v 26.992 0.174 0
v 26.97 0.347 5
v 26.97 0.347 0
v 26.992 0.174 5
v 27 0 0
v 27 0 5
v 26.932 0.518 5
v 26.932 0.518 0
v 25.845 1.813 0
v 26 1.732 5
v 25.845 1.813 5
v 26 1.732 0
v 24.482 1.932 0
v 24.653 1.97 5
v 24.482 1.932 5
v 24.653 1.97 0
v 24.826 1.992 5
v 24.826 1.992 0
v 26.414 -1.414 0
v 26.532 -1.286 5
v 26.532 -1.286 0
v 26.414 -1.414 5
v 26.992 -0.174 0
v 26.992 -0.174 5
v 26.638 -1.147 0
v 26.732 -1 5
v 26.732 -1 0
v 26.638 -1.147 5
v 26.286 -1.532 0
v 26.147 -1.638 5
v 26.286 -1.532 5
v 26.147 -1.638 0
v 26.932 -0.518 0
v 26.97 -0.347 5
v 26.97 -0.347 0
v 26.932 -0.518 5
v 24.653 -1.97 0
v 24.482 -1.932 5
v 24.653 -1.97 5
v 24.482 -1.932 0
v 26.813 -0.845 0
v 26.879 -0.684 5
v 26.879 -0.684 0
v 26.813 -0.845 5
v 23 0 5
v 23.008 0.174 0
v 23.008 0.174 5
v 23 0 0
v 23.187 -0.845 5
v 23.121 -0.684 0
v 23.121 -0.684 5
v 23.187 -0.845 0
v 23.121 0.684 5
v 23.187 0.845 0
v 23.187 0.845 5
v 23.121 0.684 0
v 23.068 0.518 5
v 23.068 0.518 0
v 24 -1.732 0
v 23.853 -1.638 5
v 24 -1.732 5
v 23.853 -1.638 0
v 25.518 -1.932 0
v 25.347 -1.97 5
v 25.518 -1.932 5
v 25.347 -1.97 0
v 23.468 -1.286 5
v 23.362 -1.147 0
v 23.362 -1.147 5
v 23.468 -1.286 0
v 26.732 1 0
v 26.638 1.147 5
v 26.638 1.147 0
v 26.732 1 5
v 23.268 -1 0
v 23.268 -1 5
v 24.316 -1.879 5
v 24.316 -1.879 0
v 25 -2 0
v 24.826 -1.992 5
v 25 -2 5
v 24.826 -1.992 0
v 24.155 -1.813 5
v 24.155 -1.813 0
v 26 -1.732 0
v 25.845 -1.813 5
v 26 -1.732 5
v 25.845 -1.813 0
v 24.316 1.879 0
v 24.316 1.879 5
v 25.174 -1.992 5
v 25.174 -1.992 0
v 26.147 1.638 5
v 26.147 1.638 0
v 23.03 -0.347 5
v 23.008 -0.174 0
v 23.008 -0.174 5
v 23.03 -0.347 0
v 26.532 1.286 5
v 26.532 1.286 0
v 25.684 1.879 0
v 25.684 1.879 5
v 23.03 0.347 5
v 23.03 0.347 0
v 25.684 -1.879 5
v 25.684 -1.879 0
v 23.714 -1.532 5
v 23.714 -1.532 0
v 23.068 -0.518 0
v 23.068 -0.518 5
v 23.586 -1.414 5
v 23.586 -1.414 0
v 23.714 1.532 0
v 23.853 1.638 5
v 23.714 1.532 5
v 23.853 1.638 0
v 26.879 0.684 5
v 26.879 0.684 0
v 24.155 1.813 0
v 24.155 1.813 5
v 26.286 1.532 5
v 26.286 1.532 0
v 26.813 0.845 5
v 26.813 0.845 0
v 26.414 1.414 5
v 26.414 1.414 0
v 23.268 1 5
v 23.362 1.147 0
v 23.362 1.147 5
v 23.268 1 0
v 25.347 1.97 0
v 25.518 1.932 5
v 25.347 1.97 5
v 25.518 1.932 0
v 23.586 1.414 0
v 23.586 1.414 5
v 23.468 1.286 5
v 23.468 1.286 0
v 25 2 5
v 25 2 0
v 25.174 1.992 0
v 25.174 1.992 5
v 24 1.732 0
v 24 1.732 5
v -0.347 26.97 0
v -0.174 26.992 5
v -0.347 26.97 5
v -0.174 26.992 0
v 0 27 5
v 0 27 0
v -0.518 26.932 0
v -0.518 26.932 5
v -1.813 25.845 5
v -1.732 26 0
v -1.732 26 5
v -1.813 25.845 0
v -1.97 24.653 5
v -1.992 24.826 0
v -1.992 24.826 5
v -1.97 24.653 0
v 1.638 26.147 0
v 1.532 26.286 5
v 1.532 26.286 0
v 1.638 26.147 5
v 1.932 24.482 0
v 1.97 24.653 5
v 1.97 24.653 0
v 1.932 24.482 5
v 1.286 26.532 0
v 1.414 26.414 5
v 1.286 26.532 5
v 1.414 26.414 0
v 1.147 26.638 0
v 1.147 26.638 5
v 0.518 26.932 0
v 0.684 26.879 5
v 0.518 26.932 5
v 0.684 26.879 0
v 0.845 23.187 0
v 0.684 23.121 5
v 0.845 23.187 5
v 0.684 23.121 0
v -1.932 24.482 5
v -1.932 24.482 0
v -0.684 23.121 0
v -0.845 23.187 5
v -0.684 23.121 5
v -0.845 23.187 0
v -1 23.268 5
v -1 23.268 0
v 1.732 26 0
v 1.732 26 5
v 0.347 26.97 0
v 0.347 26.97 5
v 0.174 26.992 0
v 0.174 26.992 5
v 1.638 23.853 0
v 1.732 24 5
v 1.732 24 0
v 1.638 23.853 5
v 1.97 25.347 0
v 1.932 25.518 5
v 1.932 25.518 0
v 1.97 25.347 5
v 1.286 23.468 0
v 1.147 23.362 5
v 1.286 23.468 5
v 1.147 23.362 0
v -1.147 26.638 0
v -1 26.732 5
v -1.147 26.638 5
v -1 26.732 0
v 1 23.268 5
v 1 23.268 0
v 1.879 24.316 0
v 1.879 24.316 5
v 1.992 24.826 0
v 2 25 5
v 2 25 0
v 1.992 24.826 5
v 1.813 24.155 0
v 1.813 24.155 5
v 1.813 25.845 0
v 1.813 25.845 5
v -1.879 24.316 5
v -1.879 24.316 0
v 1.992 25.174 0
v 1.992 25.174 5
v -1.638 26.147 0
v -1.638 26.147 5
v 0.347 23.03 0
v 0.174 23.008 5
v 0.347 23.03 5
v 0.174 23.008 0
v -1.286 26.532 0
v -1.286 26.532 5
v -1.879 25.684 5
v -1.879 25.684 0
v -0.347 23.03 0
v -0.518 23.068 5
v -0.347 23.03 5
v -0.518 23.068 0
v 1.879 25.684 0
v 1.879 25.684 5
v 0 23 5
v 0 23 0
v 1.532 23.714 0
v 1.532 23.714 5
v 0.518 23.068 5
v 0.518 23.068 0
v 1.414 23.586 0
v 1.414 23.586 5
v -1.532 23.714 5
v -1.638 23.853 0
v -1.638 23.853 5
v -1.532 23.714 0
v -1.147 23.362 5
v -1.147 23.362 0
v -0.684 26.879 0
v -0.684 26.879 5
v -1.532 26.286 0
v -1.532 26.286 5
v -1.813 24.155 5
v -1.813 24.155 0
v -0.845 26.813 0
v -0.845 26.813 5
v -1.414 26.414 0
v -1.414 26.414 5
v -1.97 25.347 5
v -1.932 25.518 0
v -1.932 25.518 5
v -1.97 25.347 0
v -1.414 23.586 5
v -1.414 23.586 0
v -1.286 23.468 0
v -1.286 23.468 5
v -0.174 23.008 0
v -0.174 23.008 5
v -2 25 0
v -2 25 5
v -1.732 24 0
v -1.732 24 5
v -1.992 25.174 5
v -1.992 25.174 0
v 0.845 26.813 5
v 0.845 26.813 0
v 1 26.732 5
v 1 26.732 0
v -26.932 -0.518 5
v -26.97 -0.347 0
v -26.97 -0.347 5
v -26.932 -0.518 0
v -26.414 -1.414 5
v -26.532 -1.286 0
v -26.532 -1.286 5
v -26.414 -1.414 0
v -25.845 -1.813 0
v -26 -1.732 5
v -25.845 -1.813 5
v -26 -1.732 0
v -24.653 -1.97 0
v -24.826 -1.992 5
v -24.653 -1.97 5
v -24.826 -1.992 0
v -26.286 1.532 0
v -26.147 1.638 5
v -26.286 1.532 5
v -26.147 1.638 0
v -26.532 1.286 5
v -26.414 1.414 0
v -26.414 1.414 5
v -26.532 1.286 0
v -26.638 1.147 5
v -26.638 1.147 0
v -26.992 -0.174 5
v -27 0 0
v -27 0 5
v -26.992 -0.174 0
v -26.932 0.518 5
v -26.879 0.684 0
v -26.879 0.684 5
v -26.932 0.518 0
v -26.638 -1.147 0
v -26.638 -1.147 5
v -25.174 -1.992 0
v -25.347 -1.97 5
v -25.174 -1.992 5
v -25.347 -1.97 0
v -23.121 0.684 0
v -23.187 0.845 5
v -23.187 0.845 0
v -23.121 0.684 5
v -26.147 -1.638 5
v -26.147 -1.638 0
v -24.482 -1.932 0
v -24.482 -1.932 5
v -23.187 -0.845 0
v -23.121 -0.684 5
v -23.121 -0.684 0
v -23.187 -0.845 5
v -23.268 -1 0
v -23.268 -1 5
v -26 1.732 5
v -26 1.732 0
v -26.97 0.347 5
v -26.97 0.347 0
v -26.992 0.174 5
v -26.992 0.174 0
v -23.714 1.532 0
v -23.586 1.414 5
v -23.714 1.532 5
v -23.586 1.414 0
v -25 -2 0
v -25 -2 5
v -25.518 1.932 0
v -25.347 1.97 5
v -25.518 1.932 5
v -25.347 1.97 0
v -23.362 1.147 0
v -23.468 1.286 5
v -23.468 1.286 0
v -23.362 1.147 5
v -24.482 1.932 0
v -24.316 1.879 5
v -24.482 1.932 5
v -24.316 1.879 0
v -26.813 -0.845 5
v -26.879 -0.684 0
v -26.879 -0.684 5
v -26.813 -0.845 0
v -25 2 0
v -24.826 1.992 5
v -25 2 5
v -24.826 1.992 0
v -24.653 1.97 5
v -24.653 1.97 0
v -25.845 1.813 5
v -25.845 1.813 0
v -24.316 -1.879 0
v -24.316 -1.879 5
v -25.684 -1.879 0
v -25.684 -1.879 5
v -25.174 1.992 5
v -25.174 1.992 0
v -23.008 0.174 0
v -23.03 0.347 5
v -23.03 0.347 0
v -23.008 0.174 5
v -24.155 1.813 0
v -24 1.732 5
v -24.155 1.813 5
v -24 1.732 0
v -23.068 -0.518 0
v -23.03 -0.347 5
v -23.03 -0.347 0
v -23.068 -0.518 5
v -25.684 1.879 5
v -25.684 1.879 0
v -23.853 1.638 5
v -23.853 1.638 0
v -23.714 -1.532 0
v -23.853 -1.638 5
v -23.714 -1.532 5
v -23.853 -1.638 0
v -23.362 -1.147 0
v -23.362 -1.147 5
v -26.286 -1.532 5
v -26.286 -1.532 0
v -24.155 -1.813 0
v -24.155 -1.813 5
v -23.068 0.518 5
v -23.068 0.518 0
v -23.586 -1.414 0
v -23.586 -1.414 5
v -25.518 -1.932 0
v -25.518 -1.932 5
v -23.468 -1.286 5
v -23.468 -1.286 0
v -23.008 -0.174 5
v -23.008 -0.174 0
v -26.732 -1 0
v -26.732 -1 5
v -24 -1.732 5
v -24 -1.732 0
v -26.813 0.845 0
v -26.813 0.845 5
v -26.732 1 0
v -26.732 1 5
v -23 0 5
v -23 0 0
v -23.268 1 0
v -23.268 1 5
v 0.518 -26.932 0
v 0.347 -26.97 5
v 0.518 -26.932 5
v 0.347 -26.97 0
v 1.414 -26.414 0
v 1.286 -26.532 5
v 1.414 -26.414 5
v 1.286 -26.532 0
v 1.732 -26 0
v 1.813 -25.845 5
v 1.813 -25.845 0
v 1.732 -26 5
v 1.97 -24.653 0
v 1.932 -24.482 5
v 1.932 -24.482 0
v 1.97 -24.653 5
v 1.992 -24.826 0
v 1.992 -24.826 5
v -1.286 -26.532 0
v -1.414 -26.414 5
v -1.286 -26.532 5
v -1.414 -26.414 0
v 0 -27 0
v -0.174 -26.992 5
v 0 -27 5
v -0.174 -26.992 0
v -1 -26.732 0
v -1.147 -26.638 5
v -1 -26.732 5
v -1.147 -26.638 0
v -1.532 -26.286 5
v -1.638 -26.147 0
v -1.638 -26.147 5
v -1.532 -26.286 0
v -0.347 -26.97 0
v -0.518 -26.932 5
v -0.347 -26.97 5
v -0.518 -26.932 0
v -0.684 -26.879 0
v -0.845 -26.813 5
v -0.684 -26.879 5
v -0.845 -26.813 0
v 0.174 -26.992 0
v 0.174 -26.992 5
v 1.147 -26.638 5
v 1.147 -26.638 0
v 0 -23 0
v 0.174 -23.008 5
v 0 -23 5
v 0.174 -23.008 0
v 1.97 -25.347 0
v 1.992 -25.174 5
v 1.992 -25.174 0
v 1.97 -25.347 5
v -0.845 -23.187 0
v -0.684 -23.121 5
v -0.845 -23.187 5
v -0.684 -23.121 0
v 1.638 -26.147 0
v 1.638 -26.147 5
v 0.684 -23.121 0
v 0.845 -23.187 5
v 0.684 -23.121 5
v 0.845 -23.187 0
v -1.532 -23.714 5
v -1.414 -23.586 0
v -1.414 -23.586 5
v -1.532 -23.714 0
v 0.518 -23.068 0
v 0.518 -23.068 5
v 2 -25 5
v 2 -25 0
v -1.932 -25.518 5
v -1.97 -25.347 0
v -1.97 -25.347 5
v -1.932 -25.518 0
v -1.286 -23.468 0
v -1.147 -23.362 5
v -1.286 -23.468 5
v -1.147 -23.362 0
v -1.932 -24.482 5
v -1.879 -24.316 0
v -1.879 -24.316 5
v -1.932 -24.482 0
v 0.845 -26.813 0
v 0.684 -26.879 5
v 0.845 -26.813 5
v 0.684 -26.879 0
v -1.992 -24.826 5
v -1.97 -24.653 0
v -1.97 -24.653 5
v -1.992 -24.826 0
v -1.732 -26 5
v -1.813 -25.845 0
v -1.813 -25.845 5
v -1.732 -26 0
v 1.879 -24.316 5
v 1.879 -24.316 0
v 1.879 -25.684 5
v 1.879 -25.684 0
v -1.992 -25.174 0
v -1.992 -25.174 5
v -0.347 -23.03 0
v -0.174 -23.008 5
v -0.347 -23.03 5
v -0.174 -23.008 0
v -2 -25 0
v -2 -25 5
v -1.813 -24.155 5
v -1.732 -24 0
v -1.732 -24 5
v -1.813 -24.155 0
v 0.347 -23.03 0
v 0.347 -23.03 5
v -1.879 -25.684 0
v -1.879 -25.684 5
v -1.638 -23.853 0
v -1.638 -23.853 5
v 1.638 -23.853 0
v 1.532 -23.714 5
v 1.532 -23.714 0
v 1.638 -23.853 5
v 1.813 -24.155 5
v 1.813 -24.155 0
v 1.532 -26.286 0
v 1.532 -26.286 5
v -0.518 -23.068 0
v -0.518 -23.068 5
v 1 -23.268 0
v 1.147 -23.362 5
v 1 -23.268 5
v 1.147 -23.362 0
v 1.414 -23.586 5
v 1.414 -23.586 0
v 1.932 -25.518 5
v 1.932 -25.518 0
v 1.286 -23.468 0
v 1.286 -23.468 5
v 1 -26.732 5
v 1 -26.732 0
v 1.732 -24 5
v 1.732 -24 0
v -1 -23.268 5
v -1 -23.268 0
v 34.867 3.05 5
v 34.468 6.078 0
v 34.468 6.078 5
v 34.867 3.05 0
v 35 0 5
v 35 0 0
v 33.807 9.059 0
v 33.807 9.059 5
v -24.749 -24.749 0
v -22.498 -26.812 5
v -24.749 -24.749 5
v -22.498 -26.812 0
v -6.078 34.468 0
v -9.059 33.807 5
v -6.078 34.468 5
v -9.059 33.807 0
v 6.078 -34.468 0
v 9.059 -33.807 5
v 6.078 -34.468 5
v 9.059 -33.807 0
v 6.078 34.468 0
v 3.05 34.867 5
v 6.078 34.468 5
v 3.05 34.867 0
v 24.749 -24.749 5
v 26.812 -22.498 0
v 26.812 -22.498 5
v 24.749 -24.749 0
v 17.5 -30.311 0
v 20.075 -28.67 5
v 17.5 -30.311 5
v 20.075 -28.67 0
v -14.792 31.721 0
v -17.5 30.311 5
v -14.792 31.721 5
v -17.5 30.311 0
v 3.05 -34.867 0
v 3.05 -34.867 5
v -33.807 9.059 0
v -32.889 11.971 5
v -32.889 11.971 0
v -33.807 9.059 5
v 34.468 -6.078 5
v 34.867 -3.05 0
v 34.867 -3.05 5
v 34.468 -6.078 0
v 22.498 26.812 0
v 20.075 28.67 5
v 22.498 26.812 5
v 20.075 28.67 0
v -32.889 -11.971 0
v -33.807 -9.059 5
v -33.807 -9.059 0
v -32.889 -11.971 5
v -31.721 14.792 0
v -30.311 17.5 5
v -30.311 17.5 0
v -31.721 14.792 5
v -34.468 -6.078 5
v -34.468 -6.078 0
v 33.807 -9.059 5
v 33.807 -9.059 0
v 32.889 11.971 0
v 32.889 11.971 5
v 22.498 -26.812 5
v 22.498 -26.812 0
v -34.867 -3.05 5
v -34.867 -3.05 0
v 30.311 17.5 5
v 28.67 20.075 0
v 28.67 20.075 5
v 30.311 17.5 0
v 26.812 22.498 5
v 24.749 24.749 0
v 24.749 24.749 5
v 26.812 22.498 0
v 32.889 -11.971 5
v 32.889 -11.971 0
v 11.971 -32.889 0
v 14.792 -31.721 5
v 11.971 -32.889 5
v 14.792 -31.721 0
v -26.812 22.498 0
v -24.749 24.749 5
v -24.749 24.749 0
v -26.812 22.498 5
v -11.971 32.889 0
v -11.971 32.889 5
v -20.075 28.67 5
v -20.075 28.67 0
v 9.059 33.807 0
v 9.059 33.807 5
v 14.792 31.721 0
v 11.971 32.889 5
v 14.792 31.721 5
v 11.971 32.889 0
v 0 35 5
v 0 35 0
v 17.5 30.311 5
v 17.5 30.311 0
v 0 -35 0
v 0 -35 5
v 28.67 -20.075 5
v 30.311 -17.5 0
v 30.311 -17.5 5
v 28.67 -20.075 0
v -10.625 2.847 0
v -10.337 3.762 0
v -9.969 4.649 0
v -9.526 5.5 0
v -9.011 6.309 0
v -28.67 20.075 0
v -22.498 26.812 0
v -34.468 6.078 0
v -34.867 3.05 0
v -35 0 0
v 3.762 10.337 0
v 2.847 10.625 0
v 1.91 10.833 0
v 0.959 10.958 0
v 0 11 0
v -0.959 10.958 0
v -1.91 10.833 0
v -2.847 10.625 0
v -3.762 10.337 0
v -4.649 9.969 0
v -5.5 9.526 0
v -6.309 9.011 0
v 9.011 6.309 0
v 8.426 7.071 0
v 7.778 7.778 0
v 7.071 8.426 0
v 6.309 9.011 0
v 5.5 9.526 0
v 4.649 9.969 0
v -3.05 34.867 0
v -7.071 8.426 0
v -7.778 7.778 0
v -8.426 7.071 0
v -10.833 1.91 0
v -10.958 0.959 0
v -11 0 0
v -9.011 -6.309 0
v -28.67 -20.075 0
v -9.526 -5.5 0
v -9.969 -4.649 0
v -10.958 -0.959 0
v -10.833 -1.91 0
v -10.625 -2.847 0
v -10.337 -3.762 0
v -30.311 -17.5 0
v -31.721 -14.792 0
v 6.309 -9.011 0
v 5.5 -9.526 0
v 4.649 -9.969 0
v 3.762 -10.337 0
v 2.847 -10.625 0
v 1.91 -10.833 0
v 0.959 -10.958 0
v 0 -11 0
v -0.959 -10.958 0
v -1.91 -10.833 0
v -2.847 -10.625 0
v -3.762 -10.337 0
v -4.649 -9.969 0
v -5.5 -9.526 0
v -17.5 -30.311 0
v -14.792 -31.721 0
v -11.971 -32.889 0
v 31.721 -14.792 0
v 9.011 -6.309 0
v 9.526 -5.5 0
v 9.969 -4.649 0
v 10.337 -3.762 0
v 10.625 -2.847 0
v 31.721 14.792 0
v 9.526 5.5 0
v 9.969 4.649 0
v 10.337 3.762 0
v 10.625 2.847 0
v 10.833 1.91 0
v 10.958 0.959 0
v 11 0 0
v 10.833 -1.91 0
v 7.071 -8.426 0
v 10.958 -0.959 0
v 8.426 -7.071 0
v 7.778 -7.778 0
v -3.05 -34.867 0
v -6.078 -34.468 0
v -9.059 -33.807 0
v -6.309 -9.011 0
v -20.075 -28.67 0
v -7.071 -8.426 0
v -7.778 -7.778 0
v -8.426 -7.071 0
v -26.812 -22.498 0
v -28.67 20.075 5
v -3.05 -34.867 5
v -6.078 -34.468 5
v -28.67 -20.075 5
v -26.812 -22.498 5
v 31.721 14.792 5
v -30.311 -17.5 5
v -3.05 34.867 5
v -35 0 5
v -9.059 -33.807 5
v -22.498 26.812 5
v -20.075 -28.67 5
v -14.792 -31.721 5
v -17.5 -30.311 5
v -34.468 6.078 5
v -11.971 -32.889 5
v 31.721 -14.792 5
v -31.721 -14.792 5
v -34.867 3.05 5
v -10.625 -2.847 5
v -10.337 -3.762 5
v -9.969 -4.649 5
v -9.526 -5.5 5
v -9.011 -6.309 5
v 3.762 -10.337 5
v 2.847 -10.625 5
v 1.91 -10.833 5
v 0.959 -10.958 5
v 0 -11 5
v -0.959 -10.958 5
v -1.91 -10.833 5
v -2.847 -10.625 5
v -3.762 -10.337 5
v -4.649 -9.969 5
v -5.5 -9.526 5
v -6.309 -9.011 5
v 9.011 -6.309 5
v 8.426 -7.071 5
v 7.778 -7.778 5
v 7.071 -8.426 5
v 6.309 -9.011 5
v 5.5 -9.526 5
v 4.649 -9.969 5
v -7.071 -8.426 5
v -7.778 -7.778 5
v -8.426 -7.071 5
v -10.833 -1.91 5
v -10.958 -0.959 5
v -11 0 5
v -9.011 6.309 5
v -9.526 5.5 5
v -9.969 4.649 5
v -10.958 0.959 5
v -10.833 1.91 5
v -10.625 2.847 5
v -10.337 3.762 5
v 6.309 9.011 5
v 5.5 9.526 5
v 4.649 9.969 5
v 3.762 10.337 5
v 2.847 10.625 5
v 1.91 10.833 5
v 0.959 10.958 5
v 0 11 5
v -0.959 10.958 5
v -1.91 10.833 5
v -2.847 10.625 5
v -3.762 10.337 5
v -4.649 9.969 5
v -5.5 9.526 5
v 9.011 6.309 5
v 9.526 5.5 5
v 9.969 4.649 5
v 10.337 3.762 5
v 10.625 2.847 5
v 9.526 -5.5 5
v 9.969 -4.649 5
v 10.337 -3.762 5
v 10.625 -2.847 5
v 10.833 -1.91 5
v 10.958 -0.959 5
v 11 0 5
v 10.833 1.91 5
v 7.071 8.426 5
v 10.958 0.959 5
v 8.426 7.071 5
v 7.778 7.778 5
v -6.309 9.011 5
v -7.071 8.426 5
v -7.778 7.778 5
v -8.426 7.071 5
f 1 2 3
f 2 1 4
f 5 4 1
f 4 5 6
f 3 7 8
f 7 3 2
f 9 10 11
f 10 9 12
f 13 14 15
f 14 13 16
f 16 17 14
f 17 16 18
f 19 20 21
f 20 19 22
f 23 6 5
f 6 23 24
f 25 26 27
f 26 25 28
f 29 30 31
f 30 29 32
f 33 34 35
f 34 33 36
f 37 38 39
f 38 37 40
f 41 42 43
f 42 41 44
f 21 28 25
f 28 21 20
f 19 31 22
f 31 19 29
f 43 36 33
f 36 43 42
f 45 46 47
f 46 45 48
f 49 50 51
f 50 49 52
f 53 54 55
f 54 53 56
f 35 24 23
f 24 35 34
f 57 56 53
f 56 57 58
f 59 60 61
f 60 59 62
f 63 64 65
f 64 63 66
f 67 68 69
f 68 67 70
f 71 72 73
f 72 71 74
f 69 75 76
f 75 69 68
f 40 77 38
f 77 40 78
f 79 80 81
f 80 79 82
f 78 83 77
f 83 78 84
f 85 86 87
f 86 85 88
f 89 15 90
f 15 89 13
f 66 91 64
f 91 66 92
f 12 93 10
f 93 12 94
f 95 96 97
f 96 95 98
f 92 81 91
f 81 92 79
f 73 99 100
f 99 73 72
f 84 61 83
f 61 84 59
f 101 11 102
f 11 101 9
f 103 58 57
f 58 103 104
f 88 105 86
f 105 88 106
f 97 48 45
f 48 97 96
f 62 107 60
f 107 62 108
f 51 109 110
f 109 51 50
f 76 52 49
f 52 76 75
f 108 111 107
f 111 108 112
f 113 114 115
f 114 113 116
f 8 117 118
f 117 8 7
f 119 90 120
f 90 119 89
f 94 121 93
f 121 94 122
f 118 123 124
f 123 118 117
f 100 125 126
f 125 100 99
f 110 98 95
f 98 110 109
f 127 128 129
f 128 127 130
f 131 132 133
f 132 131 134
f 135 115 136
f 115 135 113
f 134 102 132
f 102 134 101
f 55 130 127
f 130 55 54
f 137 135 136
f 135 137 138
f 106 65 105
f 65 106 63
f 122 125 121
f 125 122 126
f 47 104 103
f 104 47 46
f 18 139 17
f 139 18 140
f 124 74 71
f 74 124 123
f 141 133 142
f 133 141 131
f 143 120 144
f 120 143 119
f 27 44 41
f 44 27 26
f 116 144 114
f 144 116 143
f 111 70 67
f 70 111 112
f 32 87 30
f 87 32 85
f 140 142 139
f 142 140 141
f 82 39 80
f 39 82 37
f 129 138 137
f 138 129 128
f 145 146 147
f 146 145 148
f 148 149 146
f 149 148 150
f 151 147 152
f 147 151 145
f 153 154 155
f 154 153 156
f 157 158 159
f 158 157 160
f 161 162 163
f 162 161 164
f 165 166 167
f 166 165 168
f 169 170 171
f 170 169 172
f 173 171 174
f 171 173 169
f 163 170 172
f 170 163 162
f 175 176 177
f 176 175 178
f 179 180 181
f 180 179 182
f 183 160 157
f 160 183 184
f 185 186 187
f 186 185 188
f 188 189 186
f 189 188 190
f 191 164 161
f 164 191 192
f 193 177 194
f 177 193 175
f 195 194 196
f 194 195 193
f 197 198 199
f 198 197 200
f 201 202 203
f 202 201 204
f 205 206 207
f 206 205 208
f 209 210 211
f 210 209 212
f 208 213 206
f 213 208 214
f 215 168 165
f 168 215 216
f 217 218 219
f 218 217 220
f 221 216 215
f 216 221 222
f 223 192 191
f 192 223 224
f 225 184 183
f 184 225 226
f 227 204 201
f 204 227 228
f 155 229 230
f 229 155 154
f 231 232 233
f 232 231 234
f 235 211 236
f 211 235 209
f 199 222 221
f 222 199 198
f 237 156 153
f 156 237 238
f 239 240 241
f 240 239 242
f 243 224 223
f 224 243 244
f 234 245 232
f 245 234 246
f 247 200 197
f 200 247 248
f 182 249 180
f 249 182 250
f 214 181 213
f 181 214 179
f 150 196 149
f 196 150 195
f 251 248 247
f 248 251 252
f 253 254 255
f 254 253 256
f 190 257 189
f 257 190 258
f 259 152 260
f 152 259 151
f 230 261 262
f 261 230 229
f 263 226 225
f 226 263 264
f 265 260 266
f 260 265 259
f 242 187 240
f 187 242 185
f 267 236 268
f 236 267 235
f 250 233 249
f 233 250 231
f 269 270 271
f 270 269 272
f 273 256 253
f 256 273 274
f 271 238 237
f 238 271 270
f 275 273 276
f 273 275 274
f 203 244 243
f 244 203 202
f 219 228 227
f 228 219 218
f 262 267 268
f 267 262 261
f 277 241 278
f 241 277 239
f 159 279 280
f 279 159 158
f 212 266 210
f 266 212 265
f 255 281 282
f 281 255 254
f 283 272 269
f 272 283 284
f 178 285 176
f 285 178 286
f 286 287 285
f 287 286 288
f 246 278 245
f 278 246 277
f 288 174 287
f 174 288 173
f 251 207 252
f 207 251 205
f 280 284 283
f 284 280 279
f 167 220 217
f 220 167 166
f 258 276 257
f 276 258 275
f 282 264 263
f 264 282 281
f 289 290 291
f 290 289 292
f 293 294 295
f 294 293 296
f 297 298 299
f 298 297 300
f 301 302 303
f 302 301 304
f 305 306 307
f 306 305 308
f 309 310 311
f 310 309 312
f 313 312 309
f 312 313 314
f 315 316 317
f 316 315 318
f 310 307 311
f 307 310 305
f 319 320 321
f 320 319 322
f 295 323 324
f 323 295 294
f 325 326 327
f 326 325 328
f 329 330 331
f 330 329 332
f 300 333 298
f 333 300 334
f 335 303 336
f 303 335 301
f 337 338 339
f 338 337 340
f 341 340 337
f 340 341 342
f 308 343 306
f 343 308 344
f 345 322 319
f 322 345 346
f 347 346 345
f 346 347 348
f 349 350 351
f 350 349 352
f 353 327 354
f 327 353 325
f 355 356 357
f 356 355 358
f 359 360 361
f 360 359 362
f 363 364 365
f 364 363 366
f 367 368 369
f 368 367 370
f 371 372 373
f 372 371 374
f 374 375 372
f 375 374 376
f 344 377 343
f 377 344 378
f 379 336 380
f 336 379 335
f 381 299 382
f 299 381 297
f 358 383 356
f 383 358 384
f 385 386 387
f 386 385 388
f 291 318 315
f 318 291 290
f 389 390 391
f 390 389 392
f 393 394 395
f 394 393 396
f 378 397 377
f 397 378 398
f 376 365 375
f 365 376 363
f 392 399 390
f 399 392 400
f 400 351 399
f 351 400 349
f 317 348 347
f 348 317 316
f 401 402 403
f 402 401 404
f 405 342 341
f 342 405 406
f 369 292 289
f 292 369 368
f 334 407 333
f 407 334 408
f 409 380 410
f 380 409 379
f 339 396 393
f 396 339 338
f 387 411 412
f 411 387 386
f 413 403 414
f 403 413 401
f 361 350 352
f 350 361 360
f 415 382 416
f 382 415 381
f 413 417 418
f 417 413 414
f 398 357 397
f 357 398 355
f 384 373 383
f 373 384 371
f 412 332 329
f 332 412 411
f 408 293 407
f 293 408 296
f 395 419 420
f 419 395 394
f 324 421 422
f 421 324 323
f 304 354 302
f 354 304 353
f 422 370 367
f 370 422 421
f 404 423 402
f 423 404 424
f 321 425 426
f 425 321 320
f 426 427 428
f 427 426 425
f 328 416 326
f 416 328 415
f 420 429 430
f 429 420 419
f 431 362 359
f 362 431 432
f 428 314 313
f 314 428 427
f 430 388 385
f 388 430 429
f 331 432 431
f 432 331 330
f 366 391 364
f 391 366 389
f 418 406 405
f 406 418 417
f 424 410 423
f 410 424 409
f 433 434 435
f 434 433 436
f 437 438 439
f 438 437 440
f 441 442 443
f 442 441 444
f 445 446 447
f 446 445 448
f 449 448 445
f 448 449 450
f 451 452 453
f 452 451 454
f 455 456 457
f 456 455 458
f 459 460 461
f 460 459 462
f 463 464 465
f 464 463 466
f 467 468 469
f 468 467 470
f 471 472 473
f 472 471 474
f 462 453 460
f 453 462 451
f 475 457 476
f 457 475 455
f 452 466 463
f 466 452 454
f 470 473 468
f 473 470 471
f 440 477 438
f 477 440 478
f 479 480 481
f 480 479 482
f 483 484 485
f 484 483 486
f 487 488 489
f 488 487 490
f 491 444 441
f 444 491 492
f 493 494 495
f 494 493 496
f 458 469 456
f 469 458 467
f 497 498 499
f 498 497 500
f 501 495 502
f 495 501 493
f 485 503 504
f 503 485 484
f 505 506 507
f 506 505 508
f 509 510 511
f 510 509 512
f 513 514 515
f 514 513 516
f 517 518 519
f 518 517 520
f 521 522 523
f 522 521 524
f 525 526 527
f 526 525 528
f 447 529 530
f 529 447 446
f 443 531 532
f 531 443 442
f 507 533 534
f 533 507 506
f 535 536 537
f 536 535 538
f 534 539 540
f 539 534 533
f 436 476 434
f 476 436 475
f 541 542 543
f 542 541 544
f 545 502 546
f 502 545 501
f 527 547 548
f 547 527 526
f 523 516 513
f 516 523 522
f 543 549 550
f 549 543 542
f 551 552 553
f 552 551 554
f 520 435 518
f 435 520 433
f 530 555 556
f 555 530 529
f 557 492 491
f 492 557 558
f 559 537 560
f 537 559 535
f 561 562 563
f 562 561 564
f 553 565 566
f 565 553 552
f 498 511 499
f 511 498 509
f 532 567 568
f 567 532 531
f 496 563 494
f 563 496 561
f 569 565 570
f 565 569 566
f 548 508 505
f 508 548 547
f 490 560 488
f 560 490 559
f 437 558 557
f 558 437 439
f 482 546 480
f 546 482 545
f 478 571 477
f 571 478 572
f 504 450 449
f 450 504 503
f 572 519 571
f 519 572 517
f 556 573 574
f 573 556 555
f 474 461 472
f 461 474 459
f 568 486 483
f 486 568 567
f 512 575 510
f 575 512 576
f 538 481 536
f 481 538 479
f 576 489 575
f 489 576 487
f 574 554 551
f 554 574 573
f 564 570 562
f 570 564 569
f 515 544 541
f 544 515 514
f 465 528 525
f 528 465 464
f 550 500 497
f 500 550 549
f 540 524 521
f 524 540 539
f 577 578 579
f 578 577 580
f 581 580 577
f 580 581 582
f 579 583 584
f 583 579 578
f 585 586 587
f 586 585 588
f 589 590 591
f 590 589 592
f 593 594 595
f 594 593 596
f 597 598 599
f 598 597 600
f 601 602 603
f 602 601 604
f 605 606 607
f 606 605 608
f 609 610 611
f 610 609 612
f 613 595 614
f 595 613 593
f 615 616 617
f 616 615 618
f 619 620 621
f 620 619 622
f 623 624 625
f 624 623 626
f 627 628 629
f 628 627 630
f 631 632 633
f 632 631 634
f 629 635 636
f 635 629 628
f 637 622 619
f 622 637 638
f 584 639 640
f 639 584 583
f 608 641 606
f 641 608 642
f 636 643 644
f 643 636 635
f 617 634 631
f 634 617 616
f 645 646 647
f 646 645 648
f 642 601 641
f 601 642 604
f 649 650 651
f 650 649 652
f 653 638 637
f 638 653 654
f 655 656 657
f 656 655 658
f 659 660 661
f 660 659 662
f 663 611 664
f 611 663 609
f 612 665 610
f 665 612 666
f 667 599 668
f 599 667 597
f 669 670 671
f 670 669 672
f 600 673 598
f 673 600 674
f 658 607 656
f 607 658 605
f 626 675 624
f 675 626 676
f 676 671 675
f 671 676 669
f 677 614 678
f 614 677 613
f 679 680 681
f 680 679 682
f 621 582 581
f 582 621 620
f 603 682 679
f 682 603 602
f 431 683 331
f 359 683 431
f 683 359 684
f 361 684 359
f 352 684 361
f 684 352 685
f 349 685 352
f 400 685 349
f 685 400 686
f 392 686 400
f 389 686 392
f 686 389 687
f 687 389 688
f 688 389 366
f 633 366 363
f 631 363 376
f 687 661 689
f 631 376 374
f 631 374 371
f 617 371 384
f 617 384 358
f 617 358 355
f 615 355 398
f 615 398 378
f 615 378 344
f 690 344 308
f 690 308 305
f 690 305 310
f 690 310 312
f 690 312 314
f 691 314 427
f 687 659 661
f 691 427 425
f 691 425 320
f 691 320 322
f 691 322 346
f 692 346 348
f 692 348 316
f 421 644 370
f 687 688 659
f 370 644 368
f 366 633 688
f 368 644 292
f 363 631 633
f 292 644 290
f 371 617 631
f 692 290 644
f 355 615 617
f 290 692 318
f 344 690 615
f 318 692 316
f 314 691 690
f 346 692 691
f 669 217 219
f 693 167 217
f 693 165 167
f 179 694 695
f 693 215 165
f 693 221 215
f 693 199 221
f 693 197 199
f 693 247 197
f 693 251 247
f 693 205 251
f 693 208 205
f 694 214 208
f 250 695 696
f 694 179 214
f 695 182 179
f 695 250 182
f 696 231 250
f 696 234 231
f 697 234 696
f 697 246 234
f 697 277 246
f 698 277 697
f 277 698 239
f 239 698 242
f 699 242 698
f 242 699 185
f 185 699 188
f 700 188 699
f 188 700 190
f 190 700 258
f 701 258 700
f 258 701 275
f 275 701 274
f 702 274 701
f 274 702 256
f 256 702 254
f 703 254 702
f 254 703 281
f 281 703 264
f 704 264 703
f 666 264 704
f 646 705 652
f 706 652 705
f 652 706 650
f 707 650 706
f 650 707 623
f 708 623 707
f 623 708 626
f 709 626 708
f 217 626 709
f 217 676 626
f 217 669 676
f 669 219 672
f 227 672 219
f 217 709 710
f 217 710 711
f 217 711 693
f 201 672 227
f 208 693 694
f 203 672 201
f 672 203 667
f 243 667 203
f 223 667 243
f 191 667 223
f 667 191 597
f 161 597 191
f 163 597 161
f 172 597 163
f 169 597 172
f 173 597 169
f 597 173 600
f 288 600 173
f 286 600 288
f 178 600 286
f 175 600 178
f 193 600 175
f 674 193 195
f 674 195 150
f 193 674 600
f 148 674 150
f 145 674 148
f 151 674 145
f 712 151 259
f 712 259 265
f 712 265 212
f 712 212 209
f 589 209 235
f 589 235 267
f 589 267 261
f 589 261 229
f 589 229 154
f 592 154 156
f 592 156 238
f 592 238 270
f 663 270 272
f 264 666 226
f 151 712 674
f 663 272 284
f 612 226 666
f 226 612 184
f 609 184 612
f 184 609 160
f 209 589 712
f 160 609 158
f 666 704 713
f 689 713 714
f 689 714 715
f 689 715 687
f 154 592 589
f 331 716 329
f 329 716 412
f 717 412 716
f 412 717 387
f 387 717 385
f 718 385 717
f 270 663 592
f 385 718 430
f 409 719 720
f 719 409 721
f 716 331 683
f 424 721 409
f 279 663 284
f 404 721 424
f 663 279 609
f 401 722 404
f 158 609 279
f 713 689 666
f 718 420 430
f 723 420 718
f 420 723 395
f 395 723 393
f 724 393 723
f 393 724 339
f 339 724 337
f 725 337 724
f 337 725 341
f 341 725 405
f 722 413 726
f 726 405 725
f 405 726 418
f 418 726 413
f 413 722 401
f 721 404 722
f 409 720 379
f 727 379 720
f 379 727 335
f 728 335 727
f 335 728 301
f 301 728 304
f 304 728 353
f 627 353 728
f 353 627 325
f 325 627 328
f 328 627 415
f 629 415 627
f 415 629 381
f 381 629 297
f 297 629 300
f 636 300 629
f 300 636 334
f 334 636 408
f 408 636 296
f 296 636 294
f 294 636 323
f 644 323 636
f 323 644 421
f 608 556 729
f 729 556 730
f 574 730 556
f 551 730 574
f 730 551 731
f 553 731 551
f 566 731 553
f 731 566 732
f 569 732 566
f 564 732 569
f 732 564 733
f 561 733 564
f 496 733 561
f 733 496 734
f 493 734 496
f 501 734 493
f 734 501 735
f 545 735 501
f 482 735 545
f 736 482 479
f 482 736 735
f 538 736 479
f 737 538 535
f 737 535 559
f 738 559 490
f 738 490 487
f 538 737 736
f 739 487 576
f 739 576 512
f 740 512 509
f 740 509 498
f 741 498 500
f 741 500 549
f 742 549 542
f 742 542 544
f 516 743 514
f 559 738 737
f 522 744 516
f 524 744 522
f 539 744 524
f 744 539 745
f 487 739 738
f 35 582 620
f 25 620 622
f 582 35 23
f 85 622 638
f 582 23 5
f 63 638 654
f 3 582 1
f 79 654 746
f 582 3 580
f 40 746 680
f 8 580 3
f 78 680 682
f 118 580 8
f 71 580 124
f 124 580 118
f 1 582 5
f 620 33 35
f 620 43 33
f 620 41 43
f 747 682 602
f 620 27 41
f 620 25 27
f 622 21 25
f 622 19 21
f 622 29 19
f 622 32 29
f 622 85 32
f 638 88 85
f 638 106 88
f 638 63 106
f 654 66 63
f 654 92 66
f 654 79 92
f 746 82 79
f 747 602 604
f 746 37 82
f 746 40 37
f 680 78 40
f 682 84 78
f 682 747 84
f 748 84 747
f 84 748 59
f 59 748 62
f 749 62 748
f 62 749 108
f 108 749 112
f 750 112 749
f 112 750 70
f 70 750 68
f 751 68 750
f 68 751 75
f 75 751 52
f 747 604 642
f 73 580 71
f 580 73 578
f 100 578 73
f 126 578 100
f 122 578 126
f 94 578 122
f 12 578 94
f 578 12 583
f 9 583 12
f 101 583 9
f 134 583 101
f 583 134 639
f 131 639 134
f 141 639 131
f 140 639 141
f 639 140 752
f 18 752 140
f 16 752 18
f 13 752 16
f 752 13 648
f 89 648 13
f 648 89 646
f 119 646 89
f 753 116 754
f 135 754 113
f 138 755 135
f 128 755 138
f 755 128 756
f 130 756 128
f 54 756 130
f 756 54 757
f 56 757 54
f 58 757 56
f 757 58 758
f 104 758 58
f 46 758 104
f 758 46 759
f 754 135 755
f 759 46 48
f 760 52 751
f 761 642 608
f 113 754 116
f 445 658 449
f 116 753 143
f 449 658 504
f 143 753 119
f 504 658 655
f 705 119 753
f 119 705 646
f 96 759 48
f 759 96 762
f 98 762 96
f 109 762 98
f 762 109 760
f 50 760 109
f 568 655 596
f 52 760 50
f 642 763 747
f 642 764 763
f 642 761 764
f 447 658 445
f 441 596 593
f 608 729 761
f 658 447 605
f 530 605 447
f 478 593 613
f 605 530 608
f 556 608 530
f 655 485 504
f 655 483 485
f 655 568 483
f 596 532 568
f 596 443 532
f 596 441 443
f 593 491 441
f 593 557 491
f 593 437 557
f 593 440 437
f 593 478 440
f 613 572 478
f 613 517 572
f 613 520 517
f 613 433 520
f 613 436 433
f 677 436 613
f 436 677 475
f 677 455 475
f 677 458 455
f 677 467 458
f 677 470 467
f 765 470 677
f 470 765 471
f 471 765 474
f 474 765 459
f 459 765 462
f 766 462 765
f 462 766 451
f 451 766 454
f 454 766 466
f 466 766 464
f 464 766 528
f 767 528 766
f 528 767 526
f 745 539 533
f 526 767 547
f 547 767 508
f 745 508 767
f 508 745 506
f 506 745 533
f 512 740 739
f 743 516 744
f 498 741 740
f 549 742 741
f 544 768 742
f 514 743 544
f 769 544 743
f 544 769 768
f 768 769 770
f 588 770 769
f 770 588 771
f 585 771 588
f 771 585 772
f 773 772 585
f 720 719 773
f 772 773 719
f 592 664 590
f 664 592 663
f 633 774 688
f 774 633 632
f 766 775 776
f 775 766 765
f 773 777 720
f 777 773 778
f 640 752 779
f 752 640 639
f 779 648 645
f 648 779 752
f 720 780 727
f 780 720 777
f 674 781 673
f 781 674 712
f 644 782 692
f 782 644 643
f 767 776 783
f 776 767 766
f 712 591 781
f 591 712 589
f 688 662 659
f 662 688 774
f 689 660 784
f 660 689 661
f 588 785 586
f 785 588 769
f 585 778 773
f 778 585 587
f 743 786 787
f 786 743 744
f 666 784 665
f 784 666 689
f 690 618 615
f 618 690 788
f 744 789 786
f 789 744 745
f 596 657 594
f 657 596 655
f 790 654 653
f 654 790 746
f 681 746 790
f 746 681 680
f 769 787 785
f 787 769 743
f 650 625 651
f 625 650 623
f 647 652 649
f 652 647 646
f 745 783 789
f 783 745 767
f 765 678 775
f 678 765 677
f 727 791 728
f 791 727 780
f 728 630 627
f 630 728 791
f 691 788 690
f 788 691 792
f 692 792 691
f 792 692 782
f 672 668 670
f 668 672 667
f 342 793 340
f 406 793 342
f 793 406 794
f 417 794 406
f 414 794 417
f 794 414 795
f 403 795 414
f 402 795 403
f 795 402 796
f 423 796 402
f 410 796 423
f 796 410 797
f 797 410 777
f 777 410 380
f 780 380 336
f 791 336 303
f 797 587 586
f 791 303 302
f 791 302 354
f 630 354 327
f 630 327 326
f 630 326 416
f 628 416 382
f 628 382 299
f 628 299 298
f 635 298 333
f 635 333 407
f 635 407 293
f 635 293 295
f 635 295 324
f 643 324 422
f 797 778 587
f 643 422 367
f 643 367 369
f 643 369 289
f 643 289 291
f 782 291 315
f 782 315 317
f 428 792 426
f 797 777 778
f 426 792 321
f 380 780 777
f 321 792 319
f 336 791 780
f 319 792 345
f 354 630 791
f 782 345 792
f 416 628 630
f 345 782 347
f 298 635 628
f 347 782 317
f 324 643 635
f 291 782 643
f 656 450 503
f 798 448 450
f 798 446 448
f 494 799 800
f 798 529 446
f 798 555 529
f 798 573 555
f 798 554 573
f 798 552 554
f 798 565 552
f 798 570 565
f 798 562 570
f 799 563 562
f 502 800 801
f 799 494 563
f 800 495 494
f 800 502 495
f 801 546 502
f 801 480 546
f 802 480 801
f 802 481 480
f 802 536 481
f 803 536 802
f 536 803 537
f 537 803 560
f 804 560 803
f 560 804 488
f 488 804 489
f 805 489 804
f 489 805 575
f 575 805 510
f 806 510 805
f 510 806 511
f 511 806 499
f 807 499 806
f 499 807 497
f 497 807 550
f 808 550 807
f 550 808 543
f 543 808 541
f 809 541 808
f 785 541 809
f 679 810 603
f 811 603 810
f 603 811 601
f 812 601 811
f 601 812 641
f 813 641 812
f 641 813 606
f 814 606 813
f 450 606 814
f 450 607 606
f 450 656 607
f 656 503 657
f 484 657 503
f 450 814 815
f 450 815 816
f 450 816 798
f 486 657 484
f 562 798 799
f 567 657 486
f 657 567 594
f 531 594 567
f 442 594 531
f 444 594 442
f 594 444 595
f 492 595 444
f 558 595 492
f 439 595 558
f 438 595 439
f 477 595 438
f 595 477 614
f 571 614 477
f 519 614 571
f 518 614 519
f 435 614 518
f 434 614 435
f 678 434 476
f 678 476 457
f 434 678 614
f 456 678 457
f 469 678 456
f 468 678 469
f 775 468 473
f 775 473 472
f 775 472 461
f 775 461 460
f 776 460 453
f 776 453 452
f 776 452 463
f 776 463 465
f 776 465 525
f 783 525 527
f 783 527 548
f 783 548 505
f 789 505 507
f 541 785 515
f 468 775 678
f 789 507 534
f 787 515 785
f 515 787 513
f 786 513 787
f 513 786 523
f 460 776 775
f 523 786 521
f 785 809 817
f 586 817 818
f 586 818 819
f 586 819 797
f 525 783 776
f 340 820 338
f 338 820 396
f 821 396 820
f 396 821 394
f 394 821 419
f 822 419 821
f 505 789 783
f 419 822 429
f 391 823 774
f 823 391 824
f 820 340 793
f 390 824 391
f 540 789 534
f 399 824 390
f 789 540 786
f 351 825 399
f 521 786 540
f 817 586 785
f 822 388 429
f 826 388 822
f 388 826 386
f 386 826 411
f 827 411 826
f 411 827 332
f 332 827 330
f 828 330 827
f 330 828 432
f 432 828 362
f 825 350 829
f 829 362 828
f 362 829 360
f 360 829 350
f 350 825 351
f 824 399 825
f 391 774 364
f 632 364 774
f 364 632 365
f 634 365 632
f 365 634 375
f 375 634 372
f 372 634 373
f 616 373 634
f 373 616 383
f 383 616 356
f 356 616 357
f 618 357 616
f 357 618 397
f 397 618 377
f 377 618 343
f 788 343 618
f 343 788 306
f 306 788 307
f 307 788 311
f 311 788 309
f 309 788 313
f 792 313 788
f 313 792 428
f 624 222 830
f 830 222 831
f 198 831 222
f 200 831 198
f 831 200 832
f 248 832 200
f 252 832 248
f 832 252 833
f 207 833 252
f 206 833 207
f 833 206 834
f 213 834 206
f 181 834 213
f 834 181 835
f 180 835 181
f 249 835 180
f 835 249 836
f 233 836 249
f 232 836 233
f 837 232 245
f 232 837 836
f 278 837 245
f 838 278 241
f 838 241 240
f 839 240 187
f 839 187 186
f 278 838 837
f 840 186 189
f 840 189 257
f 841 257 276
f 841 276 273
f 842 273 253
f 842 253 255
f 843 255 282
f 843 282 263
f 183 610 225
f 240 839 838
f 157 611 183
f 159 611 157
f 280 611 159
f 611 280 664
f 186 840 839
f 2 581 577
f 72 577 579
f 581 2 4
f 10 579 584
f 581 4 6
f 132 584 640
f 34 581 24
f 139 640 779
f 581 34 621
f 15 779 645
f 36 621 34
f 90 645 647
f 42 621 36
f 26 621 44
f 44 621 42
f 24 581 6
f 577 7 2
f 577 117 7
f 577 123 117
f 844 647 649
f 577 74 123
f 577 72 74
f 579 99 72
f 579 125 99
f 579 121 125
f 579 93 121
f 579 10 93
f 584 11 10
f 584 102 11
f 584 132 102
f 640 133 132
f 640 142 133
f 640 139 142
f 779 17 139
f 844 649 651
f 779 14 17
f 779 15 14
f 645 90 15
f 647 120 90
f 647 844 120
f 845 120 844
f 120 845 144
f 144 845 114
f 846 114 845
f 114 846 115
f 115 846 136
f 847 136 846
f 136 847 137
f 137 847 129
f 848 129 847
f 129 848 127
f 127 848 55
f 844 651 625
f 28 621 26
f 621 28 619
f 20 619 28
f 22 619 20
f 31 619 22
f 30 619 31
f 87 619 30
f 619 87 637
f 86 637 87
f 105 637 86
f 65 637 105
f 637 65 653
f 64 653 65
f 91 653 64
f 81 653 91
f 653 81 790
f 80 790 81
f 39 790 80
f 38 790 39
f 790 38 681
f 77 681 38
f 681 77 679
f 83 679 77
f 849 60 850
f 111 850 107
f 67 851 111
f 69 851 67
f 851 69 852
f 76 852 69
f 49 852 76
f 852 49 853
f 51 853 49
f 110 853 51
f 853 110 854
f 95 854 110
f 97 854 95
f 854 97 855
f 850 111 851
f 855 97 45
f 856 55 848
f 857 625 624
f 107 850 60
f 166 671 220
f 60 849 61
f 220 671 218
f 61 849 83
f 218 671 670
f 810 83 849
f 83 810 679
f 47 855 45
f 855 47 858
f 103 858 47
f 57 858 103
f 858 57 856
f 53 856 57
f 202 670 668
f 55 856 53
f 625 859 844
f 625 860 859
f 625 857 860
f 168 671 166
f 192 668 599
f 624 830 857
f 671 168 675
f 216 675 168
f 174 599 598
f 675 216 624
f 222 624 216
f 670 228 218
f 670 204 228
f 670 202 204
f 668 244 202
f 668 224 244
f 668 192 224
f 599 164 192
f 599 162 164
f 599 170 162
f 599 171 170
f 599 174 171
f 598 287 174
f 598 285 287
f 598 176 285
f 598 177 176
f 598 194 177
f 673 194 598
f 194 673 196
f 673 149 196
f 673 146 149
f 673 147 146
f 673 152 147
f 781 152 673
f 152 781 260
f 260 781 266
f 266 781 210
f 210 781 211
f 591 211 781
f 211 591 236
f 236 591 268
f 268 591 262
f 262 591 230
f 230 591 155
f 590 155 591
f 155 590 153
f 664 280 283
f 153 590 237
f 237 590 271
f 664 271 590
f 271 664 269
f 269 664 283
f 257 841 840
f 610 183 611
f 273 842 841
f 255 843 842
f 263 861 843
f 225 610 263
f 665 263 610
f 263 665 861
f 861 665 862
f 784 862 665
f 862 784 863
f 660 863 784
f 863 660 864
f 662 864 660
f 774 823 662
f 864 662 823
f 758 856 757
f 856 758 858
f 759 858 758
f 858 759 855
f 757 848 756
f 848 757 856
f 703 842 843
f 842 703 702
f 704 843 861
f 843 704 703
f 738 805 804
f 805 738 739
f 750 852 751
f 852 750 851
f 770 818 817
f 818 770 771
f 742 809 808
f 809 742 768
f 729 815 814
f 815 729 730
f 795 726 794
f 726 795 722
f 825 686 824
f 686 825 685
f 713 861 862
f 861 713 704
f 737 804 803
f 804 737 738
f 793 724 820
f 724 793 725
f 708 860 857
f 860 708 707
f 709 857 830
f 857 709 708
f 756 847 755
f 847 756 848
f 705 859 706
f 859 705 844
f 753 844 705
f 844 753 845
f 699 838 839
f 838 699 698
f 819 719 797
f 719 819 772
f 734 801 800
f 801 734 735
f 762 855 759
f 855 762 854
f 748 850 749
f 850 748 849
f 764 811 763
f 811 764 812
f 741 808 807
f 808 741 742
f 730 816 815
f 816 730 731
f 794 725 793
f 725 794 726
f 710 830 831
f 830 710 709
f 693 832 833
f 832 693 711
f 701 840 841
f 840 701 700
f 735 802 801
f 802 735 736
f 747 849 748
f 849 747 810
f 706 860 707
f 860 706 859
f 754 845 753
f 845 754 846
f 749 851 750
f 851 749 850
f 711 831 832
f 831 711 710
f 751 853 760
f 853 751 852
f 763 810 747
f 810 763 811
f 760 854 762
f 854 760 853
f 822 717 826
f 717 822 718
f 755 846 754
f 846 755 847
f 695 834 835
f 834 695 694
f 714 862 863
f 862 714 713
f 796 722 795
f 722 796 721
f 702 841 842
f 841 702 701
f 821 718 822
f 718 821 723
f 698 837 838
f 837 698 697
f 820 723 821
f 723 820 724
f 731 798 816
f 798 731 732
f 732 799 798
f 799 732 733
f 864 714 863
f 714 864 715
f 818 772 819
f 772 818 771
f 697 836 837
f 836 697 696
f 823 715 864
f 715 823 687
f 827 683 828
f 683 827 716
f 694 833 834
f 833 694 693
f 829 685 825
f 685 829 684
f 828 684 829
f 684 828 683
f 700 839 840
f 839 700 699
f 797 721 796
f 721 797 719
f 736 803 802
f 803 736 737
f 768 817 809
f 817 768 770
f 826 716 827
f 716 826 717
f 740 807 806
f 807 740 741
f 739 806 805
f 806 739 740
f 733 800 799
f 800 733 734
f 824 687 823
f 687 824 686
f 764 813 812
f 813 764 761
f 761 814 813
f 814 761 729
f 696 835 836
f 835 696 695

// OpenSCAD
// Round motor mount plate - a disk with a center bore and a bolt circle, to mount a round
// motor or bearing. NOVEL general part.
//
// @desc round motor mount plate with a center bore and a bolt circle
// @prompt Design a motor mount plate in OpenSCAD: a round plate {plate_d} mm across and {t} mm thick, with a {bore} mm center bore and {holes} bolt holes {screw} mm on a {bolt_circle} mm bolt circle. Reply with a single complete OpenSCAD file.
// @param plate_d     plate diameter, mm        [40:120]
// @param bore        center bore, mm           [8:40]
// @param bolt_circle bolt circle diameter, mm  [25:100]
// @param holes       number of bolt holes      [3:8:1]
// @param screw       bolt hole diameter, mm     [3:6]
// @param t           plate thickness, mm        [3:8]

plate_d     = 70;
bore        = 22;
bolt_circle = 50;
holes       = 4;
screw       = 4;
t           = 5;

$fn = 72;

difference() {
    cylinder(h = t, d = plate_d);
    translate([0, 0, -1]) cylinder(h = t + 2, d = bore);
    for (i = [0 : holes - 1])
        rotate([0, 0, i * 360 / holes]) translate([bolt_circle / 2, 0, -1]) cylinder(h = t + 2, d = screw);
}
